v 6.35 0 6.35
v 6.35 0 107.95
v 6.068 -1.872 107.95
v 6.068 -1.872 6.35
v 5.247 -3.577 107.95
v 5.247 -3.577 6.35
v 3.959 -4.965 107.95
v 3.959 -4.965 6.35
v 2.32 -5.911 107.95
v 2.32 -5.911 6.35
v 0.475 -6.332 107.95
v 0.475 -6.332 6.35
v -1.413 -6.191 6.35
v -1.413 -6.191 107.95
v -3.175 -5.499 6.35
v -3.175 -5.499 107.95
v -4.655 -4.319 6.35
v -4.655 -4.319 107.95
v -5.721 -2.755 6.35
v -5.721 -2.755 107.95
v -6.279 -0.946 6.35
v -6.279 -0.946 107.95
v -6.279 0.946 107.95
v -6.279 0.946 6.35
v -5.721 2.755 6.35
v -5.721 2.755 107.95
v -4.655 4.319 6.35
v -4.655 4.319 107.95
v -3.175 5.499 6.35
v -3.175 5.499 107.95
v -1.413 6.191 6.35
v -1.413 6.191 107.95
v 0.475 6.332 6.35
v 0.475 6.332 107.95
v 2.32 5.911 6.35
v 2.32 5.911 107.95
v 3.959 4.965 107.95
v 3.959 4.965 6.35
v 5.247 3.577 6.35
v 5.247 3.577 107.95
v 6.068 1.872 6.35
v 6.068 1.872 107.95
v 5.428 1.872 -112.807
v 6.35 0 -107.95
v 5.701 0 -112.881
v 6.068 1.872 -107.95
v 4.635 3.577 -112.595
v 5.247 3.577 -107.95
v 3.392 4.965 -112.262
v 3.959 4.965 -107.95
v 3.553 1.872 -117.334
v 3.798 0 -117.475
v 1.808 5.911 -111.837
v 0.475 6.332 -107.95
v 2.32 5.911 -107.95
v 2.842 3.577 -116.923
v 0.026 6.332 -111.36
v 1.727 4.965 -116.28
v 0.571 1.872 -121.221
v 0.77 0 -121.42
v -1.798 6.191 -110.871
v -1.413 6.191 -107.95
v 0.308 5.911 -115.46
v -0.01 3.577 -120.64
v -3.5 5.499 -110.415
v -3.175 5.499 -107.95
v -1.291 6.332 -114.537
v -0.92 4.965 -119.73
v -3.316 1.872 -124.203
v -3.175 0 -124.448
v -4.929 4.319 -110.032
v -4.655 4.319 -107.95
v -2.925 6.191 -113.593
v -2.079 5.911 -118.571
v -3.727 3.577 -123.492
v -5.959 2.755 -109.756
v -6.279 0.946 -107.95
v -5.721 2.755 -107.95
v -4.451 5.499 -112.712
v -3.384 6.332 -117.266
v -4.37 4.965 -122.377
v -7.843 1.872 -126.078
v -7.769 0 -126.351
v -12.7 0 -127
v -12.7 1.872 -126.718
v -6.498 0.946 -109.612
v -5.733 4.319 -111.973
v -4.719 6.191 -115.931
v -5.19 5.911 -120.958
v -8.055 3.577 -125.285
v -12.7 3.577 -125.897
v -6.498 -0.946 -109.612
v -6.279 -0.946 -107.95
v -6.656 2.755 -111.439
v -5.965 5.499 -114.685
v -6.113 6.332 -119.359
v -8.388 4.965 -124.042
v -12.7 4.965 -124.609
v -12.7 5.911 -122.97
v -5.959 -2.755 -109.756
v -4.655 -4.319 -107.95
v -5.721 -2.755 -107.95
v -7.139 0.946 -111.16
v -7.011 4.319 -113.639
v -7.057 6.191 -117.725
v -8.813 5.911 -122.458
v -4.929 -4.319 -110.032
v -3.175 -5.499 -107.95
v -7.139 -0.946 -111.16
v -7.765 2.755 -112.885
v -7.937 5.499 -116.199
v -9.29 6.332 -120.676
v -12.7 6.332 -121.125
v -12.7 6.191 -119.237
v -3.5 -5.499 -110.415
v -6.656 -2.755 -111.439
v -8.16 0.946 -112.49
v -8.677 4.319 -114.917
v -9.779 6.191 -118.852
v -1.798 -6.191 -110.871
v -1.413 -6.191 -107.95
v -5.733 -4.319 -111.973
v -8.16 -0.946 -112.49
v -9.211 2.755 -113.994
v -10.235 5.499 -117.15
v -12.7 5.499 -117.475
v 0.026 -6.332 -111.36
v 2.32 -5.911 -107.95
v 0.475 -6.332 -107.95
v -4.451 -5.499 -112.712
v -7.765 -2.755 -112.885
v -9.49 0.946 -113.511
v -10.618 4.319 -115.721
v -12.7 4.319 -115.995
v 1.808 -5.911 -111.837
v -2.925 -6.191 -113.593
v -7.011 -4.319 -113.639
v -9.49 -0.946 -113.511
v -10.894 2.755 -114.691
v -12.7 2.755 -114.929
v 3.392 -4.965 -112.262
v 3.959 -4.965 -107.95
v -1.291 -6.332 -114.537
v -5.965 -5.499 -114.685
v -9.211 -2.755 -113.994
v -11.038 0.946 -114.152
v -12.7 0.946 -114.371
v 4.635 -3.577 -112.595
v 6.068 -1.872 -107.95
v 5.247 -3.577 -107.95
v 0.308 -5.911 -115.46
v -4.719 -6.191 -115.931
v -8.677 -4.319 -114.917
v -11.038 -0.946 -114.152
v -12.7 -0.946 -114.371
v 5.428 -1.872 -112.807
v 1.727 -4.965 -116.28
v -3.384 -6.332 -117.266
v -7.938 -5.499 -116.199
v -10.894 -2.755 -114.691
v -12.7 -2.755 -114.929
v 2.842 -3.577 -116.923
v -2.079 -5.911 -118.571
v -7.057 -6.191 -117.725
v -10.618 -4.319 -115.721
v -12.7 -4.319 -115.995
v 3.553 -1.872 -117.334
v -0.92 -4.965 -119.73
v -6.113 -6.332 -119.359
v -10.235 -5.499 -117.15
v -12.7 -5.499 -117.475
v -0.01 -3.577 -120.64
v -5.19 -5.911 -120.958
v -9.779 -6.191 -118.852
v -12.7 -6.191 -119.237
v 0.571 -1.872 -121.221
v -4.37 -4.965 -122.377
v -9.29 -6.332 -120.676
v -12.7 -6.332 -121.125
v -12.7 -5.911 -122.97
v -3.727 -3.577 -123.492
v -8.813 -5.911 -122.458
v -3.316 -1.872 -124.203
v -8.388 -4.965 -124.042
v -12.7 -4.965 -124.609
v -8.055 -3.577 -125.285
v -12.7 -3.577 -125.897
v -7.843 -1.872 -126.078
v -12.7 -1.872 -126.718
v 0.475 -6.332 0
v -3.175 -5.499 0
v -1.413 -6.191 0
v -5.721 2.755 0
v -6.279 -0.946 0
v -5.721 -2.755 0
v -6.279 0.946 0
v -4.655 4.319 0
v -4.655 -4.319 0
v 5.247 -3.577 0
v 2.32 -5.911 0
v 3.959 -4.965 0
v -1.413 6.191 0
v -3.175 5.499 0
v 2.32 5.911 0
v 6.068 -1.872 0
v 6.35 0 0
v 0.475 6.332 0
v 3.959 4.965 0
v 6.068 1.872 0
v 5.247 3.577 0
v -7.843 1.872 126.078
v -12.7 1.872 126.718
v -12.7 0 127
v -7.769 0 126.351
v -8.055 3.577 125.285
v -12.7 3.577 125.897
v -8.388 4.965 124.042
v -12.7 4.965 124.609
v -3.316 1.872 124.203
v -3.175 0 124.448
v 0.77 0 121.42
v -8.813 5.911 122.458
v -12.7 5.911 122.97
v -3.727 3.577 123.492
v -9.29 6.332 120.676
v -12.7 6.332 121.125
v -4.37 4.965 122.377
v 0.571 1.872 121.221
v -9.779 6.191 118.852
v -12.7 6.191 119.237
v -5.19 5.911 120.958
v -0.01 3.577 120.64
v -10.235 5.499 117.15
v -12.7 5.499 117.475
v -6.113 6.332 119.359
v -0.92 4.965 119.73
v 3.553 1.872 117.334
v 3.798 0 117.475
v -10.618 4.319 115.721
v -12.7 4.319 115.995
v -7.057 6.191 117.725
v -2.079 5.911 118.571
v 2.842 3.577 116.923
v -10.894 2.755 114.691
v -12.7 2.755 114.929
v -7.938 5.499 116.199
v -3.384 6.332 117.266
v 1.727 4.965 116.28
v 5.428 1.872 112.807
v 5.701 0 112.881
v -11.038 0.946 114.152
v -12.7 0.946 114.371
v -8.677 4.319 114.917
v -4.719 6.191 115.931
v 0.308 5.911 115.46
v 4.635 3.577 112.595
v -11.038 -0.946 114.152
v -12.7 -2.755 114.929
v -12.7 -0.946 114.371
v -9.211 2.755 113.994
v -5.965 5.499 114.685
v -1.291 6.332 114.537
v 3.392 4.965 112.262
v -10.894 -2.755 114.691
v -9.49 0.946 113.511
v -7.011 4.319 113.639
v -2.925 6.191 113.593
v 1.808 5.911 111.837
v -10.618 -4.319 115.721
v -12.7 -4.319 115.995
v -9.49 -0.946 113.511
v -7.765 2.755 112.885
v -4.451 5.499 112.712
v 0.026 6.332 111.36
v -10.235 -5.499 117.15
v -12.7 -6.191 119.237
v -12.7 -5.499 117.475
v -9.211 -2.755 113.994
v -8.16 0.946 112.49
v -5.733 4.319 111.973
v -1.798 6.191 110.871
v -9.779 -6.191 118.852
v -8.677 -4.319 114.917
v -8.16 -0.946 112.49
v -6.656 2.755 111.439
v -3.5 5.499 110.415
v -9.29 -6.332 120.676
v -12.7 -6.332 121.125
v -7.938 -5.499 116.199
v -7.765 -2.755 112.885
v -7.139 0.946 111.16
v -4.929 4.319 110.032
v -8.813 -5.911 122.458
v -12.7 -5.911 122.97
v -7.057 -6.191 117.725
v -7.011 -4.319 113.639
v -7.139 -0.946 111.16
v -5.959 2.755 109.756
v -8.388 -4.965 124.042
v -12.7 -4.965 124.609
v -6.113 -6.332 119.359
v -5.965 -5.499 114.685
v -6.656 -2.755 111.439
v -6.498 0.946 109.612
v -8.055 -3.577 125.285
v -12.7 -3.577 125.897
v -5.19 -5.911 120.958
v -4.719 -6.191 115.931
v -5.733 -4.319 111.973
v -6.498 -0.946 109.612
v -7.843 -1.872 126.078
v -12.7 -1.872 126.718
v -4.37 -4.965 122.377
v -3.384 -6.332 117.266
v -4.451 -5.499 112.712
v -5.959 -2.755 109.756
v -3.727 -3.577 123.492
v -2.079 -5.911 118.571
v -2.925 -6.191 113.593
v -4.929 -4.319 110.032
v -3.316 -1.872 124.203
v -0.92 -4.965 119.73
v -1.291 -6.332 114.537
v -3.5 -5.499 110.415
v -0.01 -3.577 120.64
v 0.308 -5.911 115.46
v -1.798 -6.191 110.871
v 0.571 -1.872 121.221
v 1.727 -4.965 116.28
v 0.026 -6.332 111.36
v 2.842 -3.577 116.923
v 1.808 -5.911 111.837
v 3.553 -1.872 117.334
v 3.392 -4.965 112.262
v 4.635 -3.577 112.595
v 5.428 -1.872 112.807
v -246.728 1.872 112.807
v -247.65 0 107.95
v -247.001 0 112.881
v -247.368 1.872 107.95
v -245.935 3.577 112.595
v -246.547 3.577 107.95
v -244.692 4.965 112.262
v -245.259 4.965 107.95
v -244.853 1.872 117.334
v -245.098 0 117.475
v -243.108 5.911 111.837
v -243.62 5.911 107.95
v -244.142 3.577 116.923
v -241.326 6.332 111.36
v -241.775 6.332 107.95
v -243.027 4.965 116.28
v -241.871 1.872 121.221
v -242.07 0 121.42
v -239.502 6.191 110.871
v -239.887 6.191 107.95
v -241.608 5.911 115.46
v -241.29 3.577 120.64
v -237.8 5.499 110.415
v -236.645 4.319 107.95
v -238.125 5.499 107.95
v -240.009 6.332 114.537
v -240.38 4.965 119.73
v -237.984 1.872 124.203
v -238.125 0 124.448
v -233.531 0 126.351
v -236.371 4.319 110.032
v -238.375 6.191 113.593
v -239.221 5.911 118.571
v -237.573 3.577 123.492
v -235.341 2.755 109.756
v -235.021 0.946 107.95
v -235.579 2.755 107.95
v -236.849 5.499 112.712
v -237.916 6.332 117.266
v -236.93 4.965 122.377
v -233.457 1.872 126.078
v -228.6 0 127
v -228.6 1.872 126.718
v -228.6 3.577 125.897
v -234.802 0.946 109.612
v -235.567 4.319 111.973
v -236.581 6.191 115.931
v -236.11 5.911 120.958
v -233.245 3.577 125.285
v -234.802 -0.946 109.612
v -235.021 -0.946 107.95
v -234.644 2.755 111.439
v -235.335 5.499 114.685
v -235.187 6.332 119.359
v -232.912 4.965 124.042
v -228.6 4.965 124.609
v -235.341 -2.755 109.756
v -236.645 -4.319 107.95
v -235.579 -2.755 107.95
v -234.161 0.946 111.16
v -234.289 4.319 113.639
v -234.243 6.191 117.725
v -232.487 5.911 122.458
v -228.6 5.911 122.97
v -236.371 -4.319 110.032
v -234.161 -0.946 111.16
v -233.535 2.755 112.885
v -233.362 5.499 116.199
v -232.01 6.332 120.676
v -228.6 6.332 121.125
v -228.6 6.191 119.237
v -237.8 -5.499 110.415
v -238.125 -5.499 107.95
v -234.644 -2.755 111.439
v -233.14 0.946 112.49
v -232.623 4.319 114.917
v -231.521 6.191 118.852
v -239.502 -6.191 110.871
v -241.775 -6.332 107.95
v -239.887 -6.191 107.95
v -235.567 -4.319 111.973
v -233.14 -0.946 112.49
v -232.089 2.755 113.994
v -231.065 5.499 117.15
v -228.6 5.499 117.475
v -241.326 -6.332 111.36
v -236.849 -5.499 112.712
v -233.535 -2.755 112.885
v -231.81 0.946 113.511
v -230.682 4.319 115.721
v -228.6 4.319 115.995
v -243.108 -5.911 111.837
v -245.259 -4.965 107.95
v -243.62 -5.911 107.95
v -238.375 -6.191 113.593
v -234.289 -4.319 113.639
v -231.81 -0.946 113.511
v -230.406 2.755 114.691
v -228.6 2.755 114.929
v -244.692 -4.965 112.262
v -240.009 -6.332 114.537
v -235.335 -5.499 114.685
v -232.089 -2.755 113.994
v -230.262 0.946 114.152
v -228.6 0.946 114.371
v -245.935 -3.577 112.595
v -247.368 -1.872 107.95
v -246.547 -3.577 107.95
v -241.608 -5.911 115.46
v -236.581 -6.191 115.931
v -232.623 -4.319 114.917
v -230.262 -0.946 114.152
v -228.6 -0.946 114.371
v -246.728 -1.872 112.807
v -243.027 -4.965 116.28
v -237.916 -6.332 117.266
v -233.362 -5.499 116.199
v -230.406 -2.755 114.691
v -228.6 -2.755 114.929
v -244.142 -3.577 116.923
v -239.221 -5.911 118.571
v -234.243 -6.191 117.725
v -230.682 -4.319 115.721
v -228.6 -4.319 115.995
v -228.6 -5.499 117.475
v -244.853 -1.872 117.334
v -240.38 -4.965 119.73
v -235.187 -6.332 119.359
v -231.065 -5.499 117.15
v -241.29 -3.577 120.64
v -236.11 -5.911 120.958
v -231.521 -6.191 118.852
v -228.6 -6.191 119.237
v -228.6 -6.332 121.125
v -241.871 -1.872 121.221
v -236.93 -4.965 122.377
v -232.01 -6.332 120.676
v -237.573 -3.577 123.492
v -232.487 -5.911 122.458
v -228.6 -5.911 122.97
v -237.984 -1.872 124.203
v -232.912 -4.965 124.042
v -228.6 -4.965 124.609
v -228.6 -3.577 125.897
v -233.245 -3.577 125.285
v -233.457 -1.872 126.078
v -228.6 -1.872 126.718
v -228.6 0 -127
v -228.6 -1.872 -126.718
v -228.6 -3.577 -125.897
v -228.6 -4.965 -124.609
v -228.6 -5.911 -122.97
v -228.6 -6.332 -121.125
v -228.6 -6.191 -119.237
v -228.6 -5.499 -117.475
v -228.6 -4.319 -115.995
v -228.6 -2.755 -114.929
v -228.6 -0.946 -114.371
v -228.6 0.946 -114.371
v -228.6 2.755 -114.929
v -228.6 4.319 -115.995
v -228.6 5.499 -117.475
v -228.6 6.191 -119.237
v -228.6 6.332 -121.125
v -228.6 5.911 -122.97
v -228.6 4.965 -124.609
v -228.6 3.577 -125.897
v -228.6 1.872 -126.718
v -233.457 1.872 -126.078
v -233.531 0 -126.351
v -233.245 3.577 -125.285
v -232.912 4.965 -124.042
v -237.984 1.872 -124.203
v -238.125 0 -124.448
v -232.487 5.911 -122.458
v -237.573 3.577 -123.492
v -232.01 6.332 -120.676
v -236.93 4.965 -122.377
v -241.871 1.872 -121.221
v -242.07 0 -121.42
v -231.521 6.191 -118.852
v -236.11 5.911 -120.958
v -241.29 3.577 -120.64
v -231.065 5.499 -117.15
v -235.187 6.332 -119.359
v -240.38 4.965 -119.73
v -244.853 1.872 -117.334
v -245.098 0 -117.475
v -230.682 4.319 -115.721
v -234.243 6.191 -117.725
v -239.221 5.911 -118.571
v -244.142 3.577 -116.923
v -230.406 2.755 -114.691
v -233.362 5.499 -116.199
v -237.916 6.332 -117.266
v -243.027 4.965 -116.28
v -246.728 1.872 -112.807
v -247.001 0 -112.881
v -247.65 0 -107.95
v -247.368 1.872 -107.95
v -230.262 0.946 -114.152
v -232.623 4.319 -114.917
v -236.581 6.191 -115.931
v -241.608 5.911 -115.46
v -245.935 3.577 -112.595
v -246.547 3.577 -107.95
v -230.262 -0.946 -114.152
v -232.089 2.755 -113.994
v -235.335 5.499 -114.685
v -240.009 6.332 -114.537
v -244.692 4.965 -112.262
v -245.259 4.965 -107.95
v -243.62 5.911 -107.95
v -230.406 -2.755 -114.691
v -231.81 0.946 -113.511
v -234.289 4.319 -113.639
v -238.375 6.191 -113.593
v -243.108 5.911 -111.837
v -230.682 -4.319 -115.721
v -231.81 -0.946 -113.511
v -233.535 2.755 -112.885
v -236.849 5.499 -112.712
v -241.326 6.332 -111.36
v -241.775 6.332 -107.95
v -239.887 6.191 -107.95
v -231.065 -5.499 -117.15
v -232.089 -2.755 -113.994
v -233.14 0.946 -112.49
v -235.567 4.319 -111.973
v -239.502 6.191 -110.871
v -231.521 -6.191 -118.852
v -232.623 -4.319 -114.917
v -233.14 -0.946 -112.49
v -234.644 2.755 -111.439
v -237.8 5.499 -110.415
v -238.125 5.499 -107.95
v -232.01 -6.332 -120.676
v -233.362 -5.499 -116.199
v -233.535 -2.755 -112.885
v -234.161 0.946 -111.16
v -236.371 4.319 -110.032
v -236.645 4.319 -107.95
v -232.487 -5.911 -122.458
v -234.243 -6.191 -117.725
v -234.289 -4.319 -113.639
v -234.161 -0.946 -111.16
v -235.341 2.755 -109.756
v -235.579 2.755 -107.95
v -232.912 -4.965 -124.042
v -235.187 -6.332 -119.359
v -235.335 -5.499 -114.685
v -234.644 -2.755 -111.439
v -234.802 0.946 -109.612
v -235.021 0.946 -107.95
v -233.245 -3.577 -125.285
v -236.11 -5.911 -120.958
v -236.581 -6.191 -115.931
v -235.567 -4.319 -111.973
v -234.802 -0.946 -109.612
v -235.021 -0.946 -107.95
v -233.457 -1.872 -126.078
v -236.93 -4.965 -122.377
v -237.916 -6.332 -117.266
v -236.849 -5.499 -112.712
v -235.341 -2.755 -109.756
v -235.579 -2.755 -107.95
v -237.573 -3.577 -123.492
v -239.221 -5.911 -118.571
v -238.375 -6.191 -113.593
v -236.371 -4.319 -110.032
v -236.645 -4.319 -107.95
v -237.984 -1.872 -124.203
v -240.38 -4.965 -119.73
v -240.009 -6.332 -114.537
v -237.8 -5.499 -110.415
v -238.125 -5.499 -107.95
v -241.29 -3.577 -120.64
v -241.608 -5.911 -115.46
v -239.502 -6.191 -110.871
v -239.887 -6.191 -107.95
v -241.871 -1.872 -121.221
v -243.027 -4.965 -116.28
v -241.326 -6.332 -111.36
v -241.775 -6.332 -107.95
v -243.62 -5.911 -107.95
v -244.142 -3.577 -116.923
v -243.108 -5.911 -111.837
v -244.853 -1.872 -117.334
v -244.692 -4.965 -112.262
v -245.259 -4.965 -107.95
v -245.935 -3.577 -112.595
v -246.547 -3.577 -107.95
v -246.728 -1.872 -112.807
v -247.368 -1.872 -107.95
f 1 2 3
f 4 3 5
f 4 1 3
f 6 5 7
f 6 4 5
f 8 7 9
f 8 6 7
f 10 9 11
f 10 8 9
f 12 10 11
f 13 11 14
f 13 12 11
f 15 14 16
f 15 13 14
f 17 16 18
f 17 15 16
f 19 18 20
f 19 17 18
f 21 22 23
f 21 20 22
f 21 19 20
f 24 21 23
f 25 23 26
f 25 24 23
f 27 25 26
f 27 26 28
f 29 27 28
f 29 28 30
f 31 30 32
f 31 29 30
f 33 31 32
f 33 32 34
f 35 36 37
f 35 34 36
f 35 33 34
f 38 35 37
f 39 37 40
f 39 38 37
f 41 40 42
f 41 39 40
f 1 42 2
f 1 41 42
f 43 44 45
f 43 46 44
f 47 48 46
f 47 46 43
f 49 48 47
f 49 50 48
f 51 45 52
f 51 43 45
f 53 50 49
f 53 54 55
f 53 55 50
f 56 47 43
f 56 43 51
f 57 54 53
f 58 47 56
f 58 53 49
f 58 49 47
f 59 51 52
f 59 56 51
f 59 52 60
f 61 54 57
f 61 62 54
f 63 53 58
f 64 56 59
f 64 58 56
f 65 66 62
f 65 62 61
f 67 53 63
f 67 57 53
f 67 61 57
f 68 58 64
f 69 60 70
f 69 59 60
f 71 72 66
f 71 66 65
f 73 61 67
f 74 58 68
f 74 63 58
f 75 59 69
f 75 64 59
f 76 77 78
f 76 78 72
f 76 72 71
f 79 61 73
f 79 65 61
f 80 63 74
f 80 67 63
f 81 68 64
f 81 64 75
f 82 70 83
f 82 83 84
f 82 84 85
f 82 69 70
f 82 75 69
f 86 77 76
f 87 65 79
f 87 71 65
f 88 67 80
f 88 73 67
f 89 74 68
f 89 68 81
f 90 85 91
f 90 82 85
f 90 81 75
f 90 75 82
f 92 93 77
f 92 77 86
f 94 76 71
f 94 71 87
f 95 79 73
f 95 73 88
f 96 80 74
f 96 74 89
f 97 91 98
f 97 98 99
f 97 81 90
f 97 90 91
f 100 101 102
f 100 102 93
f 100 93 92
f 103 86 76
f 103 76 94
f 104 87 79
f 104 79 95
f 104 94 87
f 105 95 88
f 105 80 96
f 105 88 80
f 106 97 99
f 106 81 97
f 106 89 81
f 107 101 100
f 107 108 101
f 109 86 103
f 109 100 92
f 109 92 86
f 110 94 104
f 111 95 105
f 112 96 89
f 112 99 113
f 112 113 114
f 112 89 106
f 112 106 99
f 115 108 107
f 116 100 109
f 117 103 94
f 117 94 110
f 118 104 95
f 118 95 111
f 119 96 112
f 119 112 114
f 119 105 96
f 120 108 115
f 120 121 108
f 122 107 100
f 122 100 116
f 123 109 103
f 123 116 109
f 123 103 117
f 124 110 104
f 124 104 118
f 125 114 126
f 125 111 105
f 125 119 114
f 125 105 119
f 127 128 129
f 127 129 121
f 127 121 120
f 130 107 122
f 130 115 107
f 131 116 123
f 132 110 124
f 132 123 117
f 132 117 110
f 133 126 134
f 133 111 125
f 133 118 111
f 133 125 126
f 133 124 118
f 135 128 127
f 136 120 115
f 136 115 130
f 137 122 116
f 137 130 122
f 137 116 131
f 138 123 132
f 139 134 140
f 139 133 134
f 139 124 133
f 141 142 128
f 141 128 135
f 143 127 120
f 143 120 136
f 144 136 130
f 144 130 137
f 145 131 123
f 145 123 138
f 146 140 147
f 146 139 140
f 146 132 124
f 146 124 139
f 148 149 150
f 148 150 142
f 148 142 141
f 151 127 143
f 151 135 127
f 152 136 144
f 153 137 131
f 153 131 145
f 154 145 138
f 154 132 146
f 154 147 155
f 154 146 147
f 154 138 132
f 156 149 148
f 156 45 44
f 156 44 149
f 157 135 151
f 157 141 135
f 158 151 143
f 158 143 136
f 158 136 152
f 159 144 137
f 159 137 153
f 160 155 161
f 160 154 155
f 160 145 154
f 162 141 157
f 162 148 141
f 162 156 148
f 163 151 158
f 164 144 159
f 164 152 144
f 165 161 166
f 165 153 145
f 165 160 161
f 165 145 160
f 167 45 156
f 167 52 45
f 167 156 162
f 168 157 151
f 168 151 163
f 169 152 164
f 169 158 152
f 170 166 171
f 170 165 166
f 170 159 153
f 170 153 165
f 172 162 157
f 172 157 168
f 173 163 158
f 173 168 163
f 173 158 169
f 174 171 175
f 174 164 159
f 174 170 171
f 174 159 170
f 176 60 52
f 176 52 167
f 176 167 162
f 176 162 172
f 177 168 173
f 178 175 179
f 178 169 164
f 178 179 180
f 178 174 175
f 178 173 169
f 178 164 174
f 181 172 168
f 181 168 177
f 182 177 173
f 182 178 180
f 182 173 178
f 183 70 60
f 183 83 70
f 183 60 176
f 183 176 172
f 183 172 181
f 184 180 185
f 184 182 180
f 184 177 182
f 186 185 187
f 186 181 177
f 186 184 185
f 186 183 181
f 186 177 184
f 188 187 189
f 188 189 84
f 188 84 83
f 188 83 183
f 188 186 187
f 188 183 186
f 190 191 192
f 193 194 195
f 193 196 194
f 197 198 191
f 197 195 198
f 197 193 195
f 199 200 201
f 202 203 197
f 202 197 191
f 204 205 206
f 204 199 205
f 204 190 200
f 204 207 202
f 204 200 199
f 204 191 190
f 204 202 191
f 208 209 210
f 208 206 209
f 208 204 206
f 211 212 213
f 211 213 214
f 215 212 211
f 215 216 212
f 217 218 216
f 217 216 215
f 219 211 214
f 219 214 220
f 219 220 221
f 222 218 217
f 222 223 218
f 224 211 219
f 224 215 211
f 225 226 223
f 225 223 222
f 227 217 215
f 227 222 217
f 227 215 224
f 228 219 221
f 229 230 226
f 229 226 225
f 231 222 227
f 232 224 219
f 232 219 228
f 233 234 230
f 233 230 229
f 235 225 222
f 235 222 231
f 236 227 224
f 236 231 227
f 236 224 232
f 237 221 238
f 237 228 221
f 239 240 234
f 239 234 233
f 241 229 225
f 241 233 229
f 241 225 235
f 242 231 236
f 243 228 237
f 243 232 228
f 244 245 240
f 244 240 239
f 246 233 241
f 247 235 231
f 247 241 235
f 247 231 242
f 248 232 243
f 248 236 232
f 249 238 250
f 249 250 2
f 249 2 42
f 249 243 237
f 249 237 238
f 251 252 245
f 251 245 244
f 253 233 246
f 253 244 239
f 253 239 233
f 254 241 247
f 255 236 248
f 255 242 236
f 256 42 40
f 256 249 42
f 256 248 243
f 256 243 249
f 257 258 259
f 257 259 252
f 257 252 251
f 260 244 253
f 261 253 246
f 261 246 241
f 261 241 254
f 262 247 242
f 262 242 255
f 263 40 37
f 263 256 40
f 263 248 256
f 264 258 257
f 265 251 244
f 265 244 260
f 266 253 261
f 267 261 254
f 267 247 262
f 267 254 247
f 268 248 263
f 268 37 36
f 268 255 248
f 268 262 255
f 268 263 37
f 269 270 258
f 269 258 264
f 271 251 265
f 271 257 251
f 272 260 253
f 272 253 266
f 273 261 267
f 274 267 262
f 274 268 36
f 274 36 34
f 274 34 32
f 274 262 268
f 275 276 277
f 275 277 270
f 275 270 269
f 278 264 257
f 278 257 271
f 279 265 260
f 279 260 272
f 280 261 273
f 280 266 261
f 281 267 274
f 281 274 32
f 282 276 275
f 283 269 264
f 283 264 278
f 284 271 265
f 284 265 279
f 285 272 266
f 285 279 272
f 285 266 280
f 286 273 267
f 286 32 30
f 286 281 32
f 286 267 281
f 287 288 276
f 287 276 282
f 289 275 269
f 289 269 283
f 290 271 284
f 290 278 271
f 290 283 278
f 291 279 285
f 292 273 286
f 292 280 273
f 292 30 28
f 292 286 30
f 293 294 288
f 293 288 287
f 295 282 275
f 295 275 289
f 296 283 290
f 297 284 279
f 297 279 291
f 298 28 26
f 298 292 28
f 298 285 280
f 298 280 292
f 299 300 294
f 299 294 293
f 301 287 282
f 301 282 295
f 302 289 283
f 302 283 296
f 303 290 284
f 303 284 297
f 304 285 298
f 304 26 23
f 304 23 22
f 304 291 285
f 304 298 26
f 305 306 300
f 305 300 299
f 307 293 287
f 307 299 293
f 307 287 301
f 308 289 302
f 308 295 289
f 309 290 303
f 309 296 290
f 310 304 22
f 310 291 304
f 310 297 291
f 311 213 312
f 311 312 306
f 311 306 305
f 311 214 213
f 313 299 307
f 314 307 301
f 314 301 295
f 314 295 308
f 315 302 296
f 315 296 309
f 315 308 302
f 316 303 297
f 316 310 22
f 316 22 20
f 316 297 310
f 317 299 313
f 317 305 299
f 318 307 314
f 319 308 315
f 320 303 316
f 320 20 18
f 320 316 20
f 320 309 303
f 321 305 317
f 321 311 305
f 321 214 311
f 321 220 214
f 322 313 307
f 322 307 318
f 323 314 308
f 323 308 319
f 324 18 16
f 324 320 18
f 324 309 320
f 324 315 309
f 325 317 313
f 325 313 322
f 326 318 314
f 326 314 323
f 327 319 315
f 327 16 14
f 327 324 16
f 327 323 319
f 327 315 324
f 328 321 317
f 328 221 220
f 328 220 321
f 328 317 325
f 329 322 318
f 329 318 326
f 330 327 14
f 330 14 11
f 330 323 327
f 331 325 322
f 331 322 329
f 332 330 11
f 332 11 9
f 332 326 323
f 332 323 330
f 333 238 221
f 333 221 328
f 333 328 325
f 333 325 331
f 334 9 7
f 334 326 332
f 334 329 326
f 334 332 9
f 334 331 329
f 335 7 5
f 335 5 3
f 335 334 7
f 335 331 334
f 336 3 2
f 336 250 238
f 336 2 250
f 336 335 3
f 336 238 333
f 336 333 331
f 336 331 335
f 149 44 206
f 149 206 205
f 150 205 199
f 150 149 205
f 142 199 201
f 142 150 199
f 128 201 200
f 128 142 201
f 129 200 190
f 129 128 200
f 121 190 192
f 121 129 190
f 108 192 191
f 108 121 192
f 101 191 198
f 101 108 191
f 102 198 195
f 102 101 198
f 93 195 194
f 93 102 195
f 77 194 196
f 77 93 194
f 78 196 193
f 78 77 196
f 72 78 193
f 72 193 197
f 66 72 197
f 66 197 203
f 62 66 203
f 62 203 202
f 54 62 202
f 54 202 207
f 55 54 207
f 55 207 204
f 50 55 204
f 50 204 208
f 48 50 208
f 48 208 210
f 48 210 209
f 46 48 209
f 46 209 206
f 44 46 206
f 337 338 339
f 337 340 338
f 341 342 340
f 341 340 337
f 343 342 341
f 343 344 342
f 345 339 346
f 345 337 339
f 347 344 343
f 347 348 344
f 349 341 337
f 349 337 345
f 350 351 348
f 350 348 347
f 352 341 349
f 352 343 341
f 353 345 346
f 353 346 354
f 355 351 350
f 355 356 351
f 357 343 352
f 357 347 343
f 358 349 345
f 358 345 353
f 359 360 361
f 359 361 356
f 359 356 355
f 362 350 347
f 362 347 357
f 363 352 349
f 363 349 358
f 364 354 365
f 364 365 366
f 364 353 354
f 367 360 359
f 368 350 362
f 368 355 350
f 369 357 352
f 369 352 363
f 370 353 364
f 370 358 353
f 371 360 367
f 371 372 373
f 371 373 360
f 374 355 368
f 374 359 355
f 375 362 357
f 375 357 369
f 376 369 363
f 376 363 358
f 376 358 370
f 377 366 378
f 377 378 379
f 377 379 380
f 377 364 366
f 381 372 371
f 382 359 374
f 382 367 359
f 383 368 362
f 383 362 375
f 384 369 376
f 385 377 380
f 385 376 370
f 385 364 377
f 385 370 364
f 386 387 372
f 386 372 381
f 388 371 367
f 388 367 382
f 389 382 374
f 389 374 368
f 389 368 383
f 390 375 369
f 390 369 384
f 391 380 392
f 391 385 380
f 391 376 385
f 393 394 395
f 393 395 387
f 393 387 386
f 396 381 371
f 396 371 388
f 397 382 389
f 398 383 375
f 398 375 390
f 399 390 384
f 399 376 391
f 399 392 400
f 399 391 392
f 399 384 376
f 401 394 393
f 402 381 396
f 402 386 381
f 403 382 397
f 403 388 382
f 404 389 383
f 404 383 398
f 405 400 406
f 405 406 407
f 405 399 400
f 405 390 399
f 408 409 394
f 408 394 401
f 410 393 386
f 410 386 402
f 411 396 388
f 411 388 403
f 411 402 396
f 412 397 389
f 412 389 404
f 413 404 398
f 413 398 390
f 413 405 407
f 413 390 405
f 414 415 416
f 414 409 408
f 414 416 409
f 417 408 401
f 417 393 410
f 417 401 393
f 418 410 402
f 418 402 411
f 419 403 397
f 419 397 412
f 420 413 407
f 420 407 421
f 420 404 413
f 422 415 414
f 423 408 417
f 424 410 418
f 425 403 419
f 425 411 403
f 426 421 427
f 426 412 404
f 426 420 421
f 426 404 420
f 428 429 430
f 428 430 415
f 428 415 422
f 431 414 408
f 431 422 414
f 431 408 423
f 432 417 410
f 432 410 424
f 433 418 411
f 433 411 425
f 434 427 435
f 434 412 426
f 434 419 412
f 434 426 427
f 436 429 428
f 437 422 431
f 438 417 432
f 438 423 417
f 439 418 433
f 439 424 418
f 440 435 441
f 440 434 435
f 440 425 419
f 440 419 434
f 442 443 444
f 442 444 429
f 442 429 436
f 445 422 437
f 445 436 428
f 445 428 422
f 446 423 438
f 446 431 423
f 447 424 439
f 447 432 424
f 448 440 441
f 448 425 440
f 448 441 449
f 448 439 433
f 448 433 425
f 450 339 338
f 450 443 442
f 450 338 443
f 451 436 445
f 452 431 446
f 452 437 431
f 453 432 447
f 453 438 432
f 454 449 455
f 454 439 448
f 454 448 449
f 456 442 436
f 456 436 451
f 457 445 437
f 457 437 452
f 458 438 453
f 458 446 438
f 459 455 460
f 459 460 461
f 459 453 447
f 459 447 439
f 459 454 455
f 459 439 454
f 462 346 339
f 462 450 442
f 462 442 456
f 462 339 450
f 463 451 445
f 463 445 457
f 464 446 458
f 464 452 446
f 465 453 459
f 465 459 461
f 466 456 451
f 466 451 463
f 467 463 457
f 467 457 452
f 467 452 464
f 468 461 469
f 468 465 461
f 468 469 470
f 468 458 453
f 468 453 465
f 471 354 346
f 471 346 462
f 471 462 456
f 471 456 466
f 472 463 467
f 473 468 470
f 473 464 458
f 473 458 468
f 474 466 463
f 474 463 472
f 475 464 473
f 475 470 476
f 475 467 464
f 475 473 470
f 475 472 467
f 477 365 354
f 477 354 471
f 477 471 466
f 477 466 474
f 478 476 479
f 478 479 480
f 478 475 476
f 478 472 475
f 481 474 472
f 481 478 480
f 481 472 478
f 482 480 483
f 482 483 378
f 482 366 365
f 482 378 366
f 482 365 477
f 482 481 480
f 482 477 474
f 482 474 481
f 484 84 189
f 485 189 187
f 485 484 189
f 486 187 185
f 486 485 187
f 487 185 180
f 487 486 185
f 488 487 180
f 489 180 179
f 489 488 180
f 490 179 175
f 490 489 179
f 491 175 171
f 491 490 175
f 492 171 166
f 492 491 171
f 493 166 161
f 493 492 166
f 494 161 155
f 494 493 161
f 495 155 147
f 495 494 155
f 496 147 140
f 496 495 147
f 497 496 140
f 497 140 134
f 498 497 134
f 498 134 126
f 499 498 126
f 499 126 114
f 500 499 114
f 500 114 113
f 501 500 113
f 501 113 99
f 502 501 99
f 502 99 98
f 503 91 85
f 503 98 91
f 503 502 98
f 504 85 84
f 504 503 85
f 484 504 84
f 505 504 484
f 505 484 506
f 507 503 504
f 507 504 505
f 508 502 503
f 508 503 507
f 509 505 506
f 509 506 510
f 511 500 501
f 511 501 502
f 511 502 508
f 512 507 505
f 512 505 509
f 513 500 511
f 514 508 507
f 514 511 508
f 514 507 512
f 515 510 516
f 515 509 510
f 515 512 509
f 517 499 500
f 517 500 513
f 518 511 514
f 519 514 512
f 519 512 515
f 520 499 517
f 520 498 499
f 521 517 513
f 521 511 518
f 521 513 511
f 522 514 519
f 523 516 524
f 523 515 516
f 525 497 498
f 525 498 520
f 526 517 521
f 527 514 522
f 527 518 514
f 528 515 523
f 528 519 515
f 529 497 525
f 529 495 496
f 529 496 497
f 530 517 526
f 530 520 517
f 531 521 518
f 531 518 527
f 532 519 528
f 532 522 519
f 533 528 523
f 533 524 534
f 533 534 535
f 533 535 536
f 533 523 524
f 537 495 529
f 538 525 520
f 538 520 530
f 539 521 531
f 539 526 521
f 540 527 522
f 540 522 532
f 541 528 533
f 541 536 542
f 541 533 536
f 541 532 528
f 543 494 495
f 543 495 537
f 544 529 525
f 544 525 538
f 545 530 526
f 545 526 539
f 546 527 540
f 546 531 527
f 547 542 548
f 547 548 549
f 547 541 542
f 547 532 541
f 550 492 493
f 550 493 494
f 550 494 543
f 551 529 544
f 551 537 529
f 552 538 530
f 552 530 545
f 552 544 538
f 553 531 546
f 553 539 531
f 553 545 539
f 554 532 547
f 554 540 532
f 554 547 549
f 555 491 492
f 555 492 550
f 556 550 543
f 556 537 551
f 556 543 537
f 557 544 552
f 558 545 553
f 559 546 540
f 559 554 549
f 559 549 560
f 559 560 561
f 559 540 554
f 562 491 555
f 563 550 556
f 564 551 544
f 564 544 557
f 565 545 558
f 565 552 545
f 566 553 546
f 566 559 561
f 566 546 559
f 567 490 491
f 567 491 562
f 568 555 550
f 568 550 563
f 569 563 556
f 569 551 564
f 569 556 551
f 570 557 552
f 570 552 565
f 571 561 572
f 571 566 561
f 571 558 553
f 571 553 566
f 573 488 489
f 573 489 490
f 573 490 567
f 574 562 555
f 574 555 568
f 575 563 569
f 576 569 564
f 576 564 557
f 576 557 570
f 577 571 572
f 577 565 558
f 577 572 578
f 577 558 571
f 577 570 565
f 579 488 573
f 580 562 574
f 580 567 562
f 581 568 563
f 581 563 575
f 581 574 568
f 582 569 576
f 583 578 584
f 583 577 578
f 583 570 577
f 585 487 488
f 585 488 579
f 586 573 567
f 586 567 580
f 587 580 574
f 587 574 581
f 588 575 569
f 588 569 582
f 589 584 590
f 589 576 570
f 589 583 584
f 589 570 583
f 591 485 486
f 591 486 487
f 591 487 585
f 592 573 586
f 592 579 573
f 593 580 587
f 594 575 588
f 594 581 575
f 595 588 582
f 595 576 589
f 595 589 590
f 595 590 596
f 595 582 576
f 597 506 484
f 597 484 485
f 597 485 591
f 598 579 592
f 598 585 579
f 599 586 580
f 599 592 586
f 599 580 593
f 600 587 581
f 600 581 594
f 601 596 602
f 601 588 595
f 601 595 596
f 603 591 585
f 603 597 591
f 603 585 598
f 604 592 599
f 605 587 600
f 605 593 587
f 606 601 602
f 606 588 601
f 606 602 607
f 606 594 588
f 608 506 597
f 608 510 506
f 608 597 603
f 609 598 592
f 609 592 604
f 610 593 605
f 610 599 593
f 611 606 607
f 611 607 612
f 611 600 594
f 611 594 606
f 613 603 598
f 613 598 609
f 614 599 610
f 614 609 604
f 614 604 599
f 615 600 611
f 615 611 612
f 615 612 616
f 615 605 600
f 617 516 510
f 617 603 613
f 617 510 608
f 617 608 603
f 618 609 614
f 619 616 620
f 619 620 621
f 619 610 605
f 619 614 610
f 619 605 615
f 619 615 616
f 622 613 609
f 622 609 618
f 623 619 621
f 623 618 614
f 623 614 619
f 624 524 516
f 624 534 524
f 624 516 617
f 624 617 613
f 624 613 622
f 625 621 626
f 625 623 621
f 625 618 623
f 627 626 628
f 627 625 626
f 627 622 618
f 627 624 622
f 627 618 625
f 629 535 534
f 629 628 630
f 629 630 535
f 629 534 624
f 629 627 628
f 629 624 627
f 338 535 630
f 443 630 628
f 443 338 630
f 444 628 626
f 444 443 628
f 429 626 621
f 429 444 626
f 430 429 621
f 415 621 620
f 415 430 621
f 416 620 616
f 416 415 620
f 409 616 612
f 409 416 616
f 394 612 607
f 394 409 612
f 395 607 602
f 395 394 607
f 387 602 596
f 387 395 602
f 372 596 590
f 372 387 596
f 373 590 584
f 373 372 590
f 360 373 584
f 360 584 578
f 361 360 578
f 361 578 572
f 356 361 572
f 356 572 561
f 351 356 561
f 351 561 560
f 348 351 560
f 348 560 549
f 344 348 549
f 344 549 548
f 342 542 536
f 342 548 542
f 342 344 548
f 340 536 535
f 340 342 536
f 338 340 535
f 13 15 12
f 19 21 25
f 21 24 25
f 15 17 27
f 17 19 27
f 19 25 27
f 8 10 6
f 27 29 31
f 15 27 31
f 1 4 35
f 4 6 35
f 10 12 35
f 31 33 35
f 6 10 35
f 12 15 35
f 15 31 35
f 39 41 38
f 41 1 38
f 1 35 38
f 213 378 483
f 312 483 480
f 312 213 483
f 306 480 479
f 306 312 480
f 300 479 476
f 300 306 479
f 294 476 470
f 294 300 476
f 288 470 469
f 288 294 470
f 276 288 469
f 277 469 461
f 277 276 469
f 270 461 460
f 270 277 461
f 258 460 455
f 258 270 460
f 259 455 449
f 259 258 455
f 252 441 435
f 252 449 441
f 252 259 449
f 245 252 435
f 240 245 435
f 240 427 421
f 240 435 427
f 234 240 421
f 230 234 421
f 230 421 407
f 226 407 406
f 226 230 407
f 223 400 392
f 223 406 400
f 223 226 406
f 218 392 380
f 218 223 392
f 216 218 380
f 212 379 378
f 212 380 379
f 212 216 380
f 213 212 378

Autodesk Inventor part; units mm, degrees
ref_plane "YZ Plane" through (0, 0, 0) normal (1, 0, 0) x (0, 1, 0)
ref_plane "XZ Plane" through (0, 0, 0) normal (0, 1, 0) x (-1, 0, 0)
ref_plane "XY Plane" through (0, 0, 0) normal (0, 0, 1) x (1, 0, 0)
sketch "Sketch1" plane through (0, 0, 0) normal (0, 0, 1) x (1, 0, 0)
  circle A0 centre (0, 0) radius 6.35
  dimension "d0" = 12.7
sketch "Sketch2" plane through (0, 0, 0) normal (0, 1, 0) x (-1, 0, 0)
  line L0 (0, 0) -> (0, -107.95)
  line L1 (12.7, -120.65) -> (228.6, -120.65)
  line L2 (241.3, -107.95) -> (241.3, 107.95)
  line L3 (228.6, 120.65) -> (12.7, 120.65)
  line L4 (0, 107.95) -> (0, 6.35)
  arc A0 (0, -107.95) -> (12.7, -120.65) centre (12.7, -107.95) ccw
  arc A1 (228.6, -120.65) -> (241.3, -107.95) centre (228.6, -107.95) ccw
  arc A2 (241.3, 107.95) -> (228.6, 120.65) centre (228.6, 107.95) ccw
  arc A3 (12.7, 120.65) -> (0, 107.95) centre (12.7, 107.95) ccw
  point P0 (0, -120.65)
  point P1 (241.3, -120.65)
  point P2 (241.3, 120.65)
  point P3 (0, 120.65)
  dimension "d1" = 6.35
  dimension "d2" = 120.65
  dimension "d3" = 241.3
  dimension "d4" = 241.3
  dimension "d8" = 12.7
sweep "Sweep1" add profiles "Sketch1" path "Sketch2"
properties part number "Ring_Of_Rebar" material "Steel"
